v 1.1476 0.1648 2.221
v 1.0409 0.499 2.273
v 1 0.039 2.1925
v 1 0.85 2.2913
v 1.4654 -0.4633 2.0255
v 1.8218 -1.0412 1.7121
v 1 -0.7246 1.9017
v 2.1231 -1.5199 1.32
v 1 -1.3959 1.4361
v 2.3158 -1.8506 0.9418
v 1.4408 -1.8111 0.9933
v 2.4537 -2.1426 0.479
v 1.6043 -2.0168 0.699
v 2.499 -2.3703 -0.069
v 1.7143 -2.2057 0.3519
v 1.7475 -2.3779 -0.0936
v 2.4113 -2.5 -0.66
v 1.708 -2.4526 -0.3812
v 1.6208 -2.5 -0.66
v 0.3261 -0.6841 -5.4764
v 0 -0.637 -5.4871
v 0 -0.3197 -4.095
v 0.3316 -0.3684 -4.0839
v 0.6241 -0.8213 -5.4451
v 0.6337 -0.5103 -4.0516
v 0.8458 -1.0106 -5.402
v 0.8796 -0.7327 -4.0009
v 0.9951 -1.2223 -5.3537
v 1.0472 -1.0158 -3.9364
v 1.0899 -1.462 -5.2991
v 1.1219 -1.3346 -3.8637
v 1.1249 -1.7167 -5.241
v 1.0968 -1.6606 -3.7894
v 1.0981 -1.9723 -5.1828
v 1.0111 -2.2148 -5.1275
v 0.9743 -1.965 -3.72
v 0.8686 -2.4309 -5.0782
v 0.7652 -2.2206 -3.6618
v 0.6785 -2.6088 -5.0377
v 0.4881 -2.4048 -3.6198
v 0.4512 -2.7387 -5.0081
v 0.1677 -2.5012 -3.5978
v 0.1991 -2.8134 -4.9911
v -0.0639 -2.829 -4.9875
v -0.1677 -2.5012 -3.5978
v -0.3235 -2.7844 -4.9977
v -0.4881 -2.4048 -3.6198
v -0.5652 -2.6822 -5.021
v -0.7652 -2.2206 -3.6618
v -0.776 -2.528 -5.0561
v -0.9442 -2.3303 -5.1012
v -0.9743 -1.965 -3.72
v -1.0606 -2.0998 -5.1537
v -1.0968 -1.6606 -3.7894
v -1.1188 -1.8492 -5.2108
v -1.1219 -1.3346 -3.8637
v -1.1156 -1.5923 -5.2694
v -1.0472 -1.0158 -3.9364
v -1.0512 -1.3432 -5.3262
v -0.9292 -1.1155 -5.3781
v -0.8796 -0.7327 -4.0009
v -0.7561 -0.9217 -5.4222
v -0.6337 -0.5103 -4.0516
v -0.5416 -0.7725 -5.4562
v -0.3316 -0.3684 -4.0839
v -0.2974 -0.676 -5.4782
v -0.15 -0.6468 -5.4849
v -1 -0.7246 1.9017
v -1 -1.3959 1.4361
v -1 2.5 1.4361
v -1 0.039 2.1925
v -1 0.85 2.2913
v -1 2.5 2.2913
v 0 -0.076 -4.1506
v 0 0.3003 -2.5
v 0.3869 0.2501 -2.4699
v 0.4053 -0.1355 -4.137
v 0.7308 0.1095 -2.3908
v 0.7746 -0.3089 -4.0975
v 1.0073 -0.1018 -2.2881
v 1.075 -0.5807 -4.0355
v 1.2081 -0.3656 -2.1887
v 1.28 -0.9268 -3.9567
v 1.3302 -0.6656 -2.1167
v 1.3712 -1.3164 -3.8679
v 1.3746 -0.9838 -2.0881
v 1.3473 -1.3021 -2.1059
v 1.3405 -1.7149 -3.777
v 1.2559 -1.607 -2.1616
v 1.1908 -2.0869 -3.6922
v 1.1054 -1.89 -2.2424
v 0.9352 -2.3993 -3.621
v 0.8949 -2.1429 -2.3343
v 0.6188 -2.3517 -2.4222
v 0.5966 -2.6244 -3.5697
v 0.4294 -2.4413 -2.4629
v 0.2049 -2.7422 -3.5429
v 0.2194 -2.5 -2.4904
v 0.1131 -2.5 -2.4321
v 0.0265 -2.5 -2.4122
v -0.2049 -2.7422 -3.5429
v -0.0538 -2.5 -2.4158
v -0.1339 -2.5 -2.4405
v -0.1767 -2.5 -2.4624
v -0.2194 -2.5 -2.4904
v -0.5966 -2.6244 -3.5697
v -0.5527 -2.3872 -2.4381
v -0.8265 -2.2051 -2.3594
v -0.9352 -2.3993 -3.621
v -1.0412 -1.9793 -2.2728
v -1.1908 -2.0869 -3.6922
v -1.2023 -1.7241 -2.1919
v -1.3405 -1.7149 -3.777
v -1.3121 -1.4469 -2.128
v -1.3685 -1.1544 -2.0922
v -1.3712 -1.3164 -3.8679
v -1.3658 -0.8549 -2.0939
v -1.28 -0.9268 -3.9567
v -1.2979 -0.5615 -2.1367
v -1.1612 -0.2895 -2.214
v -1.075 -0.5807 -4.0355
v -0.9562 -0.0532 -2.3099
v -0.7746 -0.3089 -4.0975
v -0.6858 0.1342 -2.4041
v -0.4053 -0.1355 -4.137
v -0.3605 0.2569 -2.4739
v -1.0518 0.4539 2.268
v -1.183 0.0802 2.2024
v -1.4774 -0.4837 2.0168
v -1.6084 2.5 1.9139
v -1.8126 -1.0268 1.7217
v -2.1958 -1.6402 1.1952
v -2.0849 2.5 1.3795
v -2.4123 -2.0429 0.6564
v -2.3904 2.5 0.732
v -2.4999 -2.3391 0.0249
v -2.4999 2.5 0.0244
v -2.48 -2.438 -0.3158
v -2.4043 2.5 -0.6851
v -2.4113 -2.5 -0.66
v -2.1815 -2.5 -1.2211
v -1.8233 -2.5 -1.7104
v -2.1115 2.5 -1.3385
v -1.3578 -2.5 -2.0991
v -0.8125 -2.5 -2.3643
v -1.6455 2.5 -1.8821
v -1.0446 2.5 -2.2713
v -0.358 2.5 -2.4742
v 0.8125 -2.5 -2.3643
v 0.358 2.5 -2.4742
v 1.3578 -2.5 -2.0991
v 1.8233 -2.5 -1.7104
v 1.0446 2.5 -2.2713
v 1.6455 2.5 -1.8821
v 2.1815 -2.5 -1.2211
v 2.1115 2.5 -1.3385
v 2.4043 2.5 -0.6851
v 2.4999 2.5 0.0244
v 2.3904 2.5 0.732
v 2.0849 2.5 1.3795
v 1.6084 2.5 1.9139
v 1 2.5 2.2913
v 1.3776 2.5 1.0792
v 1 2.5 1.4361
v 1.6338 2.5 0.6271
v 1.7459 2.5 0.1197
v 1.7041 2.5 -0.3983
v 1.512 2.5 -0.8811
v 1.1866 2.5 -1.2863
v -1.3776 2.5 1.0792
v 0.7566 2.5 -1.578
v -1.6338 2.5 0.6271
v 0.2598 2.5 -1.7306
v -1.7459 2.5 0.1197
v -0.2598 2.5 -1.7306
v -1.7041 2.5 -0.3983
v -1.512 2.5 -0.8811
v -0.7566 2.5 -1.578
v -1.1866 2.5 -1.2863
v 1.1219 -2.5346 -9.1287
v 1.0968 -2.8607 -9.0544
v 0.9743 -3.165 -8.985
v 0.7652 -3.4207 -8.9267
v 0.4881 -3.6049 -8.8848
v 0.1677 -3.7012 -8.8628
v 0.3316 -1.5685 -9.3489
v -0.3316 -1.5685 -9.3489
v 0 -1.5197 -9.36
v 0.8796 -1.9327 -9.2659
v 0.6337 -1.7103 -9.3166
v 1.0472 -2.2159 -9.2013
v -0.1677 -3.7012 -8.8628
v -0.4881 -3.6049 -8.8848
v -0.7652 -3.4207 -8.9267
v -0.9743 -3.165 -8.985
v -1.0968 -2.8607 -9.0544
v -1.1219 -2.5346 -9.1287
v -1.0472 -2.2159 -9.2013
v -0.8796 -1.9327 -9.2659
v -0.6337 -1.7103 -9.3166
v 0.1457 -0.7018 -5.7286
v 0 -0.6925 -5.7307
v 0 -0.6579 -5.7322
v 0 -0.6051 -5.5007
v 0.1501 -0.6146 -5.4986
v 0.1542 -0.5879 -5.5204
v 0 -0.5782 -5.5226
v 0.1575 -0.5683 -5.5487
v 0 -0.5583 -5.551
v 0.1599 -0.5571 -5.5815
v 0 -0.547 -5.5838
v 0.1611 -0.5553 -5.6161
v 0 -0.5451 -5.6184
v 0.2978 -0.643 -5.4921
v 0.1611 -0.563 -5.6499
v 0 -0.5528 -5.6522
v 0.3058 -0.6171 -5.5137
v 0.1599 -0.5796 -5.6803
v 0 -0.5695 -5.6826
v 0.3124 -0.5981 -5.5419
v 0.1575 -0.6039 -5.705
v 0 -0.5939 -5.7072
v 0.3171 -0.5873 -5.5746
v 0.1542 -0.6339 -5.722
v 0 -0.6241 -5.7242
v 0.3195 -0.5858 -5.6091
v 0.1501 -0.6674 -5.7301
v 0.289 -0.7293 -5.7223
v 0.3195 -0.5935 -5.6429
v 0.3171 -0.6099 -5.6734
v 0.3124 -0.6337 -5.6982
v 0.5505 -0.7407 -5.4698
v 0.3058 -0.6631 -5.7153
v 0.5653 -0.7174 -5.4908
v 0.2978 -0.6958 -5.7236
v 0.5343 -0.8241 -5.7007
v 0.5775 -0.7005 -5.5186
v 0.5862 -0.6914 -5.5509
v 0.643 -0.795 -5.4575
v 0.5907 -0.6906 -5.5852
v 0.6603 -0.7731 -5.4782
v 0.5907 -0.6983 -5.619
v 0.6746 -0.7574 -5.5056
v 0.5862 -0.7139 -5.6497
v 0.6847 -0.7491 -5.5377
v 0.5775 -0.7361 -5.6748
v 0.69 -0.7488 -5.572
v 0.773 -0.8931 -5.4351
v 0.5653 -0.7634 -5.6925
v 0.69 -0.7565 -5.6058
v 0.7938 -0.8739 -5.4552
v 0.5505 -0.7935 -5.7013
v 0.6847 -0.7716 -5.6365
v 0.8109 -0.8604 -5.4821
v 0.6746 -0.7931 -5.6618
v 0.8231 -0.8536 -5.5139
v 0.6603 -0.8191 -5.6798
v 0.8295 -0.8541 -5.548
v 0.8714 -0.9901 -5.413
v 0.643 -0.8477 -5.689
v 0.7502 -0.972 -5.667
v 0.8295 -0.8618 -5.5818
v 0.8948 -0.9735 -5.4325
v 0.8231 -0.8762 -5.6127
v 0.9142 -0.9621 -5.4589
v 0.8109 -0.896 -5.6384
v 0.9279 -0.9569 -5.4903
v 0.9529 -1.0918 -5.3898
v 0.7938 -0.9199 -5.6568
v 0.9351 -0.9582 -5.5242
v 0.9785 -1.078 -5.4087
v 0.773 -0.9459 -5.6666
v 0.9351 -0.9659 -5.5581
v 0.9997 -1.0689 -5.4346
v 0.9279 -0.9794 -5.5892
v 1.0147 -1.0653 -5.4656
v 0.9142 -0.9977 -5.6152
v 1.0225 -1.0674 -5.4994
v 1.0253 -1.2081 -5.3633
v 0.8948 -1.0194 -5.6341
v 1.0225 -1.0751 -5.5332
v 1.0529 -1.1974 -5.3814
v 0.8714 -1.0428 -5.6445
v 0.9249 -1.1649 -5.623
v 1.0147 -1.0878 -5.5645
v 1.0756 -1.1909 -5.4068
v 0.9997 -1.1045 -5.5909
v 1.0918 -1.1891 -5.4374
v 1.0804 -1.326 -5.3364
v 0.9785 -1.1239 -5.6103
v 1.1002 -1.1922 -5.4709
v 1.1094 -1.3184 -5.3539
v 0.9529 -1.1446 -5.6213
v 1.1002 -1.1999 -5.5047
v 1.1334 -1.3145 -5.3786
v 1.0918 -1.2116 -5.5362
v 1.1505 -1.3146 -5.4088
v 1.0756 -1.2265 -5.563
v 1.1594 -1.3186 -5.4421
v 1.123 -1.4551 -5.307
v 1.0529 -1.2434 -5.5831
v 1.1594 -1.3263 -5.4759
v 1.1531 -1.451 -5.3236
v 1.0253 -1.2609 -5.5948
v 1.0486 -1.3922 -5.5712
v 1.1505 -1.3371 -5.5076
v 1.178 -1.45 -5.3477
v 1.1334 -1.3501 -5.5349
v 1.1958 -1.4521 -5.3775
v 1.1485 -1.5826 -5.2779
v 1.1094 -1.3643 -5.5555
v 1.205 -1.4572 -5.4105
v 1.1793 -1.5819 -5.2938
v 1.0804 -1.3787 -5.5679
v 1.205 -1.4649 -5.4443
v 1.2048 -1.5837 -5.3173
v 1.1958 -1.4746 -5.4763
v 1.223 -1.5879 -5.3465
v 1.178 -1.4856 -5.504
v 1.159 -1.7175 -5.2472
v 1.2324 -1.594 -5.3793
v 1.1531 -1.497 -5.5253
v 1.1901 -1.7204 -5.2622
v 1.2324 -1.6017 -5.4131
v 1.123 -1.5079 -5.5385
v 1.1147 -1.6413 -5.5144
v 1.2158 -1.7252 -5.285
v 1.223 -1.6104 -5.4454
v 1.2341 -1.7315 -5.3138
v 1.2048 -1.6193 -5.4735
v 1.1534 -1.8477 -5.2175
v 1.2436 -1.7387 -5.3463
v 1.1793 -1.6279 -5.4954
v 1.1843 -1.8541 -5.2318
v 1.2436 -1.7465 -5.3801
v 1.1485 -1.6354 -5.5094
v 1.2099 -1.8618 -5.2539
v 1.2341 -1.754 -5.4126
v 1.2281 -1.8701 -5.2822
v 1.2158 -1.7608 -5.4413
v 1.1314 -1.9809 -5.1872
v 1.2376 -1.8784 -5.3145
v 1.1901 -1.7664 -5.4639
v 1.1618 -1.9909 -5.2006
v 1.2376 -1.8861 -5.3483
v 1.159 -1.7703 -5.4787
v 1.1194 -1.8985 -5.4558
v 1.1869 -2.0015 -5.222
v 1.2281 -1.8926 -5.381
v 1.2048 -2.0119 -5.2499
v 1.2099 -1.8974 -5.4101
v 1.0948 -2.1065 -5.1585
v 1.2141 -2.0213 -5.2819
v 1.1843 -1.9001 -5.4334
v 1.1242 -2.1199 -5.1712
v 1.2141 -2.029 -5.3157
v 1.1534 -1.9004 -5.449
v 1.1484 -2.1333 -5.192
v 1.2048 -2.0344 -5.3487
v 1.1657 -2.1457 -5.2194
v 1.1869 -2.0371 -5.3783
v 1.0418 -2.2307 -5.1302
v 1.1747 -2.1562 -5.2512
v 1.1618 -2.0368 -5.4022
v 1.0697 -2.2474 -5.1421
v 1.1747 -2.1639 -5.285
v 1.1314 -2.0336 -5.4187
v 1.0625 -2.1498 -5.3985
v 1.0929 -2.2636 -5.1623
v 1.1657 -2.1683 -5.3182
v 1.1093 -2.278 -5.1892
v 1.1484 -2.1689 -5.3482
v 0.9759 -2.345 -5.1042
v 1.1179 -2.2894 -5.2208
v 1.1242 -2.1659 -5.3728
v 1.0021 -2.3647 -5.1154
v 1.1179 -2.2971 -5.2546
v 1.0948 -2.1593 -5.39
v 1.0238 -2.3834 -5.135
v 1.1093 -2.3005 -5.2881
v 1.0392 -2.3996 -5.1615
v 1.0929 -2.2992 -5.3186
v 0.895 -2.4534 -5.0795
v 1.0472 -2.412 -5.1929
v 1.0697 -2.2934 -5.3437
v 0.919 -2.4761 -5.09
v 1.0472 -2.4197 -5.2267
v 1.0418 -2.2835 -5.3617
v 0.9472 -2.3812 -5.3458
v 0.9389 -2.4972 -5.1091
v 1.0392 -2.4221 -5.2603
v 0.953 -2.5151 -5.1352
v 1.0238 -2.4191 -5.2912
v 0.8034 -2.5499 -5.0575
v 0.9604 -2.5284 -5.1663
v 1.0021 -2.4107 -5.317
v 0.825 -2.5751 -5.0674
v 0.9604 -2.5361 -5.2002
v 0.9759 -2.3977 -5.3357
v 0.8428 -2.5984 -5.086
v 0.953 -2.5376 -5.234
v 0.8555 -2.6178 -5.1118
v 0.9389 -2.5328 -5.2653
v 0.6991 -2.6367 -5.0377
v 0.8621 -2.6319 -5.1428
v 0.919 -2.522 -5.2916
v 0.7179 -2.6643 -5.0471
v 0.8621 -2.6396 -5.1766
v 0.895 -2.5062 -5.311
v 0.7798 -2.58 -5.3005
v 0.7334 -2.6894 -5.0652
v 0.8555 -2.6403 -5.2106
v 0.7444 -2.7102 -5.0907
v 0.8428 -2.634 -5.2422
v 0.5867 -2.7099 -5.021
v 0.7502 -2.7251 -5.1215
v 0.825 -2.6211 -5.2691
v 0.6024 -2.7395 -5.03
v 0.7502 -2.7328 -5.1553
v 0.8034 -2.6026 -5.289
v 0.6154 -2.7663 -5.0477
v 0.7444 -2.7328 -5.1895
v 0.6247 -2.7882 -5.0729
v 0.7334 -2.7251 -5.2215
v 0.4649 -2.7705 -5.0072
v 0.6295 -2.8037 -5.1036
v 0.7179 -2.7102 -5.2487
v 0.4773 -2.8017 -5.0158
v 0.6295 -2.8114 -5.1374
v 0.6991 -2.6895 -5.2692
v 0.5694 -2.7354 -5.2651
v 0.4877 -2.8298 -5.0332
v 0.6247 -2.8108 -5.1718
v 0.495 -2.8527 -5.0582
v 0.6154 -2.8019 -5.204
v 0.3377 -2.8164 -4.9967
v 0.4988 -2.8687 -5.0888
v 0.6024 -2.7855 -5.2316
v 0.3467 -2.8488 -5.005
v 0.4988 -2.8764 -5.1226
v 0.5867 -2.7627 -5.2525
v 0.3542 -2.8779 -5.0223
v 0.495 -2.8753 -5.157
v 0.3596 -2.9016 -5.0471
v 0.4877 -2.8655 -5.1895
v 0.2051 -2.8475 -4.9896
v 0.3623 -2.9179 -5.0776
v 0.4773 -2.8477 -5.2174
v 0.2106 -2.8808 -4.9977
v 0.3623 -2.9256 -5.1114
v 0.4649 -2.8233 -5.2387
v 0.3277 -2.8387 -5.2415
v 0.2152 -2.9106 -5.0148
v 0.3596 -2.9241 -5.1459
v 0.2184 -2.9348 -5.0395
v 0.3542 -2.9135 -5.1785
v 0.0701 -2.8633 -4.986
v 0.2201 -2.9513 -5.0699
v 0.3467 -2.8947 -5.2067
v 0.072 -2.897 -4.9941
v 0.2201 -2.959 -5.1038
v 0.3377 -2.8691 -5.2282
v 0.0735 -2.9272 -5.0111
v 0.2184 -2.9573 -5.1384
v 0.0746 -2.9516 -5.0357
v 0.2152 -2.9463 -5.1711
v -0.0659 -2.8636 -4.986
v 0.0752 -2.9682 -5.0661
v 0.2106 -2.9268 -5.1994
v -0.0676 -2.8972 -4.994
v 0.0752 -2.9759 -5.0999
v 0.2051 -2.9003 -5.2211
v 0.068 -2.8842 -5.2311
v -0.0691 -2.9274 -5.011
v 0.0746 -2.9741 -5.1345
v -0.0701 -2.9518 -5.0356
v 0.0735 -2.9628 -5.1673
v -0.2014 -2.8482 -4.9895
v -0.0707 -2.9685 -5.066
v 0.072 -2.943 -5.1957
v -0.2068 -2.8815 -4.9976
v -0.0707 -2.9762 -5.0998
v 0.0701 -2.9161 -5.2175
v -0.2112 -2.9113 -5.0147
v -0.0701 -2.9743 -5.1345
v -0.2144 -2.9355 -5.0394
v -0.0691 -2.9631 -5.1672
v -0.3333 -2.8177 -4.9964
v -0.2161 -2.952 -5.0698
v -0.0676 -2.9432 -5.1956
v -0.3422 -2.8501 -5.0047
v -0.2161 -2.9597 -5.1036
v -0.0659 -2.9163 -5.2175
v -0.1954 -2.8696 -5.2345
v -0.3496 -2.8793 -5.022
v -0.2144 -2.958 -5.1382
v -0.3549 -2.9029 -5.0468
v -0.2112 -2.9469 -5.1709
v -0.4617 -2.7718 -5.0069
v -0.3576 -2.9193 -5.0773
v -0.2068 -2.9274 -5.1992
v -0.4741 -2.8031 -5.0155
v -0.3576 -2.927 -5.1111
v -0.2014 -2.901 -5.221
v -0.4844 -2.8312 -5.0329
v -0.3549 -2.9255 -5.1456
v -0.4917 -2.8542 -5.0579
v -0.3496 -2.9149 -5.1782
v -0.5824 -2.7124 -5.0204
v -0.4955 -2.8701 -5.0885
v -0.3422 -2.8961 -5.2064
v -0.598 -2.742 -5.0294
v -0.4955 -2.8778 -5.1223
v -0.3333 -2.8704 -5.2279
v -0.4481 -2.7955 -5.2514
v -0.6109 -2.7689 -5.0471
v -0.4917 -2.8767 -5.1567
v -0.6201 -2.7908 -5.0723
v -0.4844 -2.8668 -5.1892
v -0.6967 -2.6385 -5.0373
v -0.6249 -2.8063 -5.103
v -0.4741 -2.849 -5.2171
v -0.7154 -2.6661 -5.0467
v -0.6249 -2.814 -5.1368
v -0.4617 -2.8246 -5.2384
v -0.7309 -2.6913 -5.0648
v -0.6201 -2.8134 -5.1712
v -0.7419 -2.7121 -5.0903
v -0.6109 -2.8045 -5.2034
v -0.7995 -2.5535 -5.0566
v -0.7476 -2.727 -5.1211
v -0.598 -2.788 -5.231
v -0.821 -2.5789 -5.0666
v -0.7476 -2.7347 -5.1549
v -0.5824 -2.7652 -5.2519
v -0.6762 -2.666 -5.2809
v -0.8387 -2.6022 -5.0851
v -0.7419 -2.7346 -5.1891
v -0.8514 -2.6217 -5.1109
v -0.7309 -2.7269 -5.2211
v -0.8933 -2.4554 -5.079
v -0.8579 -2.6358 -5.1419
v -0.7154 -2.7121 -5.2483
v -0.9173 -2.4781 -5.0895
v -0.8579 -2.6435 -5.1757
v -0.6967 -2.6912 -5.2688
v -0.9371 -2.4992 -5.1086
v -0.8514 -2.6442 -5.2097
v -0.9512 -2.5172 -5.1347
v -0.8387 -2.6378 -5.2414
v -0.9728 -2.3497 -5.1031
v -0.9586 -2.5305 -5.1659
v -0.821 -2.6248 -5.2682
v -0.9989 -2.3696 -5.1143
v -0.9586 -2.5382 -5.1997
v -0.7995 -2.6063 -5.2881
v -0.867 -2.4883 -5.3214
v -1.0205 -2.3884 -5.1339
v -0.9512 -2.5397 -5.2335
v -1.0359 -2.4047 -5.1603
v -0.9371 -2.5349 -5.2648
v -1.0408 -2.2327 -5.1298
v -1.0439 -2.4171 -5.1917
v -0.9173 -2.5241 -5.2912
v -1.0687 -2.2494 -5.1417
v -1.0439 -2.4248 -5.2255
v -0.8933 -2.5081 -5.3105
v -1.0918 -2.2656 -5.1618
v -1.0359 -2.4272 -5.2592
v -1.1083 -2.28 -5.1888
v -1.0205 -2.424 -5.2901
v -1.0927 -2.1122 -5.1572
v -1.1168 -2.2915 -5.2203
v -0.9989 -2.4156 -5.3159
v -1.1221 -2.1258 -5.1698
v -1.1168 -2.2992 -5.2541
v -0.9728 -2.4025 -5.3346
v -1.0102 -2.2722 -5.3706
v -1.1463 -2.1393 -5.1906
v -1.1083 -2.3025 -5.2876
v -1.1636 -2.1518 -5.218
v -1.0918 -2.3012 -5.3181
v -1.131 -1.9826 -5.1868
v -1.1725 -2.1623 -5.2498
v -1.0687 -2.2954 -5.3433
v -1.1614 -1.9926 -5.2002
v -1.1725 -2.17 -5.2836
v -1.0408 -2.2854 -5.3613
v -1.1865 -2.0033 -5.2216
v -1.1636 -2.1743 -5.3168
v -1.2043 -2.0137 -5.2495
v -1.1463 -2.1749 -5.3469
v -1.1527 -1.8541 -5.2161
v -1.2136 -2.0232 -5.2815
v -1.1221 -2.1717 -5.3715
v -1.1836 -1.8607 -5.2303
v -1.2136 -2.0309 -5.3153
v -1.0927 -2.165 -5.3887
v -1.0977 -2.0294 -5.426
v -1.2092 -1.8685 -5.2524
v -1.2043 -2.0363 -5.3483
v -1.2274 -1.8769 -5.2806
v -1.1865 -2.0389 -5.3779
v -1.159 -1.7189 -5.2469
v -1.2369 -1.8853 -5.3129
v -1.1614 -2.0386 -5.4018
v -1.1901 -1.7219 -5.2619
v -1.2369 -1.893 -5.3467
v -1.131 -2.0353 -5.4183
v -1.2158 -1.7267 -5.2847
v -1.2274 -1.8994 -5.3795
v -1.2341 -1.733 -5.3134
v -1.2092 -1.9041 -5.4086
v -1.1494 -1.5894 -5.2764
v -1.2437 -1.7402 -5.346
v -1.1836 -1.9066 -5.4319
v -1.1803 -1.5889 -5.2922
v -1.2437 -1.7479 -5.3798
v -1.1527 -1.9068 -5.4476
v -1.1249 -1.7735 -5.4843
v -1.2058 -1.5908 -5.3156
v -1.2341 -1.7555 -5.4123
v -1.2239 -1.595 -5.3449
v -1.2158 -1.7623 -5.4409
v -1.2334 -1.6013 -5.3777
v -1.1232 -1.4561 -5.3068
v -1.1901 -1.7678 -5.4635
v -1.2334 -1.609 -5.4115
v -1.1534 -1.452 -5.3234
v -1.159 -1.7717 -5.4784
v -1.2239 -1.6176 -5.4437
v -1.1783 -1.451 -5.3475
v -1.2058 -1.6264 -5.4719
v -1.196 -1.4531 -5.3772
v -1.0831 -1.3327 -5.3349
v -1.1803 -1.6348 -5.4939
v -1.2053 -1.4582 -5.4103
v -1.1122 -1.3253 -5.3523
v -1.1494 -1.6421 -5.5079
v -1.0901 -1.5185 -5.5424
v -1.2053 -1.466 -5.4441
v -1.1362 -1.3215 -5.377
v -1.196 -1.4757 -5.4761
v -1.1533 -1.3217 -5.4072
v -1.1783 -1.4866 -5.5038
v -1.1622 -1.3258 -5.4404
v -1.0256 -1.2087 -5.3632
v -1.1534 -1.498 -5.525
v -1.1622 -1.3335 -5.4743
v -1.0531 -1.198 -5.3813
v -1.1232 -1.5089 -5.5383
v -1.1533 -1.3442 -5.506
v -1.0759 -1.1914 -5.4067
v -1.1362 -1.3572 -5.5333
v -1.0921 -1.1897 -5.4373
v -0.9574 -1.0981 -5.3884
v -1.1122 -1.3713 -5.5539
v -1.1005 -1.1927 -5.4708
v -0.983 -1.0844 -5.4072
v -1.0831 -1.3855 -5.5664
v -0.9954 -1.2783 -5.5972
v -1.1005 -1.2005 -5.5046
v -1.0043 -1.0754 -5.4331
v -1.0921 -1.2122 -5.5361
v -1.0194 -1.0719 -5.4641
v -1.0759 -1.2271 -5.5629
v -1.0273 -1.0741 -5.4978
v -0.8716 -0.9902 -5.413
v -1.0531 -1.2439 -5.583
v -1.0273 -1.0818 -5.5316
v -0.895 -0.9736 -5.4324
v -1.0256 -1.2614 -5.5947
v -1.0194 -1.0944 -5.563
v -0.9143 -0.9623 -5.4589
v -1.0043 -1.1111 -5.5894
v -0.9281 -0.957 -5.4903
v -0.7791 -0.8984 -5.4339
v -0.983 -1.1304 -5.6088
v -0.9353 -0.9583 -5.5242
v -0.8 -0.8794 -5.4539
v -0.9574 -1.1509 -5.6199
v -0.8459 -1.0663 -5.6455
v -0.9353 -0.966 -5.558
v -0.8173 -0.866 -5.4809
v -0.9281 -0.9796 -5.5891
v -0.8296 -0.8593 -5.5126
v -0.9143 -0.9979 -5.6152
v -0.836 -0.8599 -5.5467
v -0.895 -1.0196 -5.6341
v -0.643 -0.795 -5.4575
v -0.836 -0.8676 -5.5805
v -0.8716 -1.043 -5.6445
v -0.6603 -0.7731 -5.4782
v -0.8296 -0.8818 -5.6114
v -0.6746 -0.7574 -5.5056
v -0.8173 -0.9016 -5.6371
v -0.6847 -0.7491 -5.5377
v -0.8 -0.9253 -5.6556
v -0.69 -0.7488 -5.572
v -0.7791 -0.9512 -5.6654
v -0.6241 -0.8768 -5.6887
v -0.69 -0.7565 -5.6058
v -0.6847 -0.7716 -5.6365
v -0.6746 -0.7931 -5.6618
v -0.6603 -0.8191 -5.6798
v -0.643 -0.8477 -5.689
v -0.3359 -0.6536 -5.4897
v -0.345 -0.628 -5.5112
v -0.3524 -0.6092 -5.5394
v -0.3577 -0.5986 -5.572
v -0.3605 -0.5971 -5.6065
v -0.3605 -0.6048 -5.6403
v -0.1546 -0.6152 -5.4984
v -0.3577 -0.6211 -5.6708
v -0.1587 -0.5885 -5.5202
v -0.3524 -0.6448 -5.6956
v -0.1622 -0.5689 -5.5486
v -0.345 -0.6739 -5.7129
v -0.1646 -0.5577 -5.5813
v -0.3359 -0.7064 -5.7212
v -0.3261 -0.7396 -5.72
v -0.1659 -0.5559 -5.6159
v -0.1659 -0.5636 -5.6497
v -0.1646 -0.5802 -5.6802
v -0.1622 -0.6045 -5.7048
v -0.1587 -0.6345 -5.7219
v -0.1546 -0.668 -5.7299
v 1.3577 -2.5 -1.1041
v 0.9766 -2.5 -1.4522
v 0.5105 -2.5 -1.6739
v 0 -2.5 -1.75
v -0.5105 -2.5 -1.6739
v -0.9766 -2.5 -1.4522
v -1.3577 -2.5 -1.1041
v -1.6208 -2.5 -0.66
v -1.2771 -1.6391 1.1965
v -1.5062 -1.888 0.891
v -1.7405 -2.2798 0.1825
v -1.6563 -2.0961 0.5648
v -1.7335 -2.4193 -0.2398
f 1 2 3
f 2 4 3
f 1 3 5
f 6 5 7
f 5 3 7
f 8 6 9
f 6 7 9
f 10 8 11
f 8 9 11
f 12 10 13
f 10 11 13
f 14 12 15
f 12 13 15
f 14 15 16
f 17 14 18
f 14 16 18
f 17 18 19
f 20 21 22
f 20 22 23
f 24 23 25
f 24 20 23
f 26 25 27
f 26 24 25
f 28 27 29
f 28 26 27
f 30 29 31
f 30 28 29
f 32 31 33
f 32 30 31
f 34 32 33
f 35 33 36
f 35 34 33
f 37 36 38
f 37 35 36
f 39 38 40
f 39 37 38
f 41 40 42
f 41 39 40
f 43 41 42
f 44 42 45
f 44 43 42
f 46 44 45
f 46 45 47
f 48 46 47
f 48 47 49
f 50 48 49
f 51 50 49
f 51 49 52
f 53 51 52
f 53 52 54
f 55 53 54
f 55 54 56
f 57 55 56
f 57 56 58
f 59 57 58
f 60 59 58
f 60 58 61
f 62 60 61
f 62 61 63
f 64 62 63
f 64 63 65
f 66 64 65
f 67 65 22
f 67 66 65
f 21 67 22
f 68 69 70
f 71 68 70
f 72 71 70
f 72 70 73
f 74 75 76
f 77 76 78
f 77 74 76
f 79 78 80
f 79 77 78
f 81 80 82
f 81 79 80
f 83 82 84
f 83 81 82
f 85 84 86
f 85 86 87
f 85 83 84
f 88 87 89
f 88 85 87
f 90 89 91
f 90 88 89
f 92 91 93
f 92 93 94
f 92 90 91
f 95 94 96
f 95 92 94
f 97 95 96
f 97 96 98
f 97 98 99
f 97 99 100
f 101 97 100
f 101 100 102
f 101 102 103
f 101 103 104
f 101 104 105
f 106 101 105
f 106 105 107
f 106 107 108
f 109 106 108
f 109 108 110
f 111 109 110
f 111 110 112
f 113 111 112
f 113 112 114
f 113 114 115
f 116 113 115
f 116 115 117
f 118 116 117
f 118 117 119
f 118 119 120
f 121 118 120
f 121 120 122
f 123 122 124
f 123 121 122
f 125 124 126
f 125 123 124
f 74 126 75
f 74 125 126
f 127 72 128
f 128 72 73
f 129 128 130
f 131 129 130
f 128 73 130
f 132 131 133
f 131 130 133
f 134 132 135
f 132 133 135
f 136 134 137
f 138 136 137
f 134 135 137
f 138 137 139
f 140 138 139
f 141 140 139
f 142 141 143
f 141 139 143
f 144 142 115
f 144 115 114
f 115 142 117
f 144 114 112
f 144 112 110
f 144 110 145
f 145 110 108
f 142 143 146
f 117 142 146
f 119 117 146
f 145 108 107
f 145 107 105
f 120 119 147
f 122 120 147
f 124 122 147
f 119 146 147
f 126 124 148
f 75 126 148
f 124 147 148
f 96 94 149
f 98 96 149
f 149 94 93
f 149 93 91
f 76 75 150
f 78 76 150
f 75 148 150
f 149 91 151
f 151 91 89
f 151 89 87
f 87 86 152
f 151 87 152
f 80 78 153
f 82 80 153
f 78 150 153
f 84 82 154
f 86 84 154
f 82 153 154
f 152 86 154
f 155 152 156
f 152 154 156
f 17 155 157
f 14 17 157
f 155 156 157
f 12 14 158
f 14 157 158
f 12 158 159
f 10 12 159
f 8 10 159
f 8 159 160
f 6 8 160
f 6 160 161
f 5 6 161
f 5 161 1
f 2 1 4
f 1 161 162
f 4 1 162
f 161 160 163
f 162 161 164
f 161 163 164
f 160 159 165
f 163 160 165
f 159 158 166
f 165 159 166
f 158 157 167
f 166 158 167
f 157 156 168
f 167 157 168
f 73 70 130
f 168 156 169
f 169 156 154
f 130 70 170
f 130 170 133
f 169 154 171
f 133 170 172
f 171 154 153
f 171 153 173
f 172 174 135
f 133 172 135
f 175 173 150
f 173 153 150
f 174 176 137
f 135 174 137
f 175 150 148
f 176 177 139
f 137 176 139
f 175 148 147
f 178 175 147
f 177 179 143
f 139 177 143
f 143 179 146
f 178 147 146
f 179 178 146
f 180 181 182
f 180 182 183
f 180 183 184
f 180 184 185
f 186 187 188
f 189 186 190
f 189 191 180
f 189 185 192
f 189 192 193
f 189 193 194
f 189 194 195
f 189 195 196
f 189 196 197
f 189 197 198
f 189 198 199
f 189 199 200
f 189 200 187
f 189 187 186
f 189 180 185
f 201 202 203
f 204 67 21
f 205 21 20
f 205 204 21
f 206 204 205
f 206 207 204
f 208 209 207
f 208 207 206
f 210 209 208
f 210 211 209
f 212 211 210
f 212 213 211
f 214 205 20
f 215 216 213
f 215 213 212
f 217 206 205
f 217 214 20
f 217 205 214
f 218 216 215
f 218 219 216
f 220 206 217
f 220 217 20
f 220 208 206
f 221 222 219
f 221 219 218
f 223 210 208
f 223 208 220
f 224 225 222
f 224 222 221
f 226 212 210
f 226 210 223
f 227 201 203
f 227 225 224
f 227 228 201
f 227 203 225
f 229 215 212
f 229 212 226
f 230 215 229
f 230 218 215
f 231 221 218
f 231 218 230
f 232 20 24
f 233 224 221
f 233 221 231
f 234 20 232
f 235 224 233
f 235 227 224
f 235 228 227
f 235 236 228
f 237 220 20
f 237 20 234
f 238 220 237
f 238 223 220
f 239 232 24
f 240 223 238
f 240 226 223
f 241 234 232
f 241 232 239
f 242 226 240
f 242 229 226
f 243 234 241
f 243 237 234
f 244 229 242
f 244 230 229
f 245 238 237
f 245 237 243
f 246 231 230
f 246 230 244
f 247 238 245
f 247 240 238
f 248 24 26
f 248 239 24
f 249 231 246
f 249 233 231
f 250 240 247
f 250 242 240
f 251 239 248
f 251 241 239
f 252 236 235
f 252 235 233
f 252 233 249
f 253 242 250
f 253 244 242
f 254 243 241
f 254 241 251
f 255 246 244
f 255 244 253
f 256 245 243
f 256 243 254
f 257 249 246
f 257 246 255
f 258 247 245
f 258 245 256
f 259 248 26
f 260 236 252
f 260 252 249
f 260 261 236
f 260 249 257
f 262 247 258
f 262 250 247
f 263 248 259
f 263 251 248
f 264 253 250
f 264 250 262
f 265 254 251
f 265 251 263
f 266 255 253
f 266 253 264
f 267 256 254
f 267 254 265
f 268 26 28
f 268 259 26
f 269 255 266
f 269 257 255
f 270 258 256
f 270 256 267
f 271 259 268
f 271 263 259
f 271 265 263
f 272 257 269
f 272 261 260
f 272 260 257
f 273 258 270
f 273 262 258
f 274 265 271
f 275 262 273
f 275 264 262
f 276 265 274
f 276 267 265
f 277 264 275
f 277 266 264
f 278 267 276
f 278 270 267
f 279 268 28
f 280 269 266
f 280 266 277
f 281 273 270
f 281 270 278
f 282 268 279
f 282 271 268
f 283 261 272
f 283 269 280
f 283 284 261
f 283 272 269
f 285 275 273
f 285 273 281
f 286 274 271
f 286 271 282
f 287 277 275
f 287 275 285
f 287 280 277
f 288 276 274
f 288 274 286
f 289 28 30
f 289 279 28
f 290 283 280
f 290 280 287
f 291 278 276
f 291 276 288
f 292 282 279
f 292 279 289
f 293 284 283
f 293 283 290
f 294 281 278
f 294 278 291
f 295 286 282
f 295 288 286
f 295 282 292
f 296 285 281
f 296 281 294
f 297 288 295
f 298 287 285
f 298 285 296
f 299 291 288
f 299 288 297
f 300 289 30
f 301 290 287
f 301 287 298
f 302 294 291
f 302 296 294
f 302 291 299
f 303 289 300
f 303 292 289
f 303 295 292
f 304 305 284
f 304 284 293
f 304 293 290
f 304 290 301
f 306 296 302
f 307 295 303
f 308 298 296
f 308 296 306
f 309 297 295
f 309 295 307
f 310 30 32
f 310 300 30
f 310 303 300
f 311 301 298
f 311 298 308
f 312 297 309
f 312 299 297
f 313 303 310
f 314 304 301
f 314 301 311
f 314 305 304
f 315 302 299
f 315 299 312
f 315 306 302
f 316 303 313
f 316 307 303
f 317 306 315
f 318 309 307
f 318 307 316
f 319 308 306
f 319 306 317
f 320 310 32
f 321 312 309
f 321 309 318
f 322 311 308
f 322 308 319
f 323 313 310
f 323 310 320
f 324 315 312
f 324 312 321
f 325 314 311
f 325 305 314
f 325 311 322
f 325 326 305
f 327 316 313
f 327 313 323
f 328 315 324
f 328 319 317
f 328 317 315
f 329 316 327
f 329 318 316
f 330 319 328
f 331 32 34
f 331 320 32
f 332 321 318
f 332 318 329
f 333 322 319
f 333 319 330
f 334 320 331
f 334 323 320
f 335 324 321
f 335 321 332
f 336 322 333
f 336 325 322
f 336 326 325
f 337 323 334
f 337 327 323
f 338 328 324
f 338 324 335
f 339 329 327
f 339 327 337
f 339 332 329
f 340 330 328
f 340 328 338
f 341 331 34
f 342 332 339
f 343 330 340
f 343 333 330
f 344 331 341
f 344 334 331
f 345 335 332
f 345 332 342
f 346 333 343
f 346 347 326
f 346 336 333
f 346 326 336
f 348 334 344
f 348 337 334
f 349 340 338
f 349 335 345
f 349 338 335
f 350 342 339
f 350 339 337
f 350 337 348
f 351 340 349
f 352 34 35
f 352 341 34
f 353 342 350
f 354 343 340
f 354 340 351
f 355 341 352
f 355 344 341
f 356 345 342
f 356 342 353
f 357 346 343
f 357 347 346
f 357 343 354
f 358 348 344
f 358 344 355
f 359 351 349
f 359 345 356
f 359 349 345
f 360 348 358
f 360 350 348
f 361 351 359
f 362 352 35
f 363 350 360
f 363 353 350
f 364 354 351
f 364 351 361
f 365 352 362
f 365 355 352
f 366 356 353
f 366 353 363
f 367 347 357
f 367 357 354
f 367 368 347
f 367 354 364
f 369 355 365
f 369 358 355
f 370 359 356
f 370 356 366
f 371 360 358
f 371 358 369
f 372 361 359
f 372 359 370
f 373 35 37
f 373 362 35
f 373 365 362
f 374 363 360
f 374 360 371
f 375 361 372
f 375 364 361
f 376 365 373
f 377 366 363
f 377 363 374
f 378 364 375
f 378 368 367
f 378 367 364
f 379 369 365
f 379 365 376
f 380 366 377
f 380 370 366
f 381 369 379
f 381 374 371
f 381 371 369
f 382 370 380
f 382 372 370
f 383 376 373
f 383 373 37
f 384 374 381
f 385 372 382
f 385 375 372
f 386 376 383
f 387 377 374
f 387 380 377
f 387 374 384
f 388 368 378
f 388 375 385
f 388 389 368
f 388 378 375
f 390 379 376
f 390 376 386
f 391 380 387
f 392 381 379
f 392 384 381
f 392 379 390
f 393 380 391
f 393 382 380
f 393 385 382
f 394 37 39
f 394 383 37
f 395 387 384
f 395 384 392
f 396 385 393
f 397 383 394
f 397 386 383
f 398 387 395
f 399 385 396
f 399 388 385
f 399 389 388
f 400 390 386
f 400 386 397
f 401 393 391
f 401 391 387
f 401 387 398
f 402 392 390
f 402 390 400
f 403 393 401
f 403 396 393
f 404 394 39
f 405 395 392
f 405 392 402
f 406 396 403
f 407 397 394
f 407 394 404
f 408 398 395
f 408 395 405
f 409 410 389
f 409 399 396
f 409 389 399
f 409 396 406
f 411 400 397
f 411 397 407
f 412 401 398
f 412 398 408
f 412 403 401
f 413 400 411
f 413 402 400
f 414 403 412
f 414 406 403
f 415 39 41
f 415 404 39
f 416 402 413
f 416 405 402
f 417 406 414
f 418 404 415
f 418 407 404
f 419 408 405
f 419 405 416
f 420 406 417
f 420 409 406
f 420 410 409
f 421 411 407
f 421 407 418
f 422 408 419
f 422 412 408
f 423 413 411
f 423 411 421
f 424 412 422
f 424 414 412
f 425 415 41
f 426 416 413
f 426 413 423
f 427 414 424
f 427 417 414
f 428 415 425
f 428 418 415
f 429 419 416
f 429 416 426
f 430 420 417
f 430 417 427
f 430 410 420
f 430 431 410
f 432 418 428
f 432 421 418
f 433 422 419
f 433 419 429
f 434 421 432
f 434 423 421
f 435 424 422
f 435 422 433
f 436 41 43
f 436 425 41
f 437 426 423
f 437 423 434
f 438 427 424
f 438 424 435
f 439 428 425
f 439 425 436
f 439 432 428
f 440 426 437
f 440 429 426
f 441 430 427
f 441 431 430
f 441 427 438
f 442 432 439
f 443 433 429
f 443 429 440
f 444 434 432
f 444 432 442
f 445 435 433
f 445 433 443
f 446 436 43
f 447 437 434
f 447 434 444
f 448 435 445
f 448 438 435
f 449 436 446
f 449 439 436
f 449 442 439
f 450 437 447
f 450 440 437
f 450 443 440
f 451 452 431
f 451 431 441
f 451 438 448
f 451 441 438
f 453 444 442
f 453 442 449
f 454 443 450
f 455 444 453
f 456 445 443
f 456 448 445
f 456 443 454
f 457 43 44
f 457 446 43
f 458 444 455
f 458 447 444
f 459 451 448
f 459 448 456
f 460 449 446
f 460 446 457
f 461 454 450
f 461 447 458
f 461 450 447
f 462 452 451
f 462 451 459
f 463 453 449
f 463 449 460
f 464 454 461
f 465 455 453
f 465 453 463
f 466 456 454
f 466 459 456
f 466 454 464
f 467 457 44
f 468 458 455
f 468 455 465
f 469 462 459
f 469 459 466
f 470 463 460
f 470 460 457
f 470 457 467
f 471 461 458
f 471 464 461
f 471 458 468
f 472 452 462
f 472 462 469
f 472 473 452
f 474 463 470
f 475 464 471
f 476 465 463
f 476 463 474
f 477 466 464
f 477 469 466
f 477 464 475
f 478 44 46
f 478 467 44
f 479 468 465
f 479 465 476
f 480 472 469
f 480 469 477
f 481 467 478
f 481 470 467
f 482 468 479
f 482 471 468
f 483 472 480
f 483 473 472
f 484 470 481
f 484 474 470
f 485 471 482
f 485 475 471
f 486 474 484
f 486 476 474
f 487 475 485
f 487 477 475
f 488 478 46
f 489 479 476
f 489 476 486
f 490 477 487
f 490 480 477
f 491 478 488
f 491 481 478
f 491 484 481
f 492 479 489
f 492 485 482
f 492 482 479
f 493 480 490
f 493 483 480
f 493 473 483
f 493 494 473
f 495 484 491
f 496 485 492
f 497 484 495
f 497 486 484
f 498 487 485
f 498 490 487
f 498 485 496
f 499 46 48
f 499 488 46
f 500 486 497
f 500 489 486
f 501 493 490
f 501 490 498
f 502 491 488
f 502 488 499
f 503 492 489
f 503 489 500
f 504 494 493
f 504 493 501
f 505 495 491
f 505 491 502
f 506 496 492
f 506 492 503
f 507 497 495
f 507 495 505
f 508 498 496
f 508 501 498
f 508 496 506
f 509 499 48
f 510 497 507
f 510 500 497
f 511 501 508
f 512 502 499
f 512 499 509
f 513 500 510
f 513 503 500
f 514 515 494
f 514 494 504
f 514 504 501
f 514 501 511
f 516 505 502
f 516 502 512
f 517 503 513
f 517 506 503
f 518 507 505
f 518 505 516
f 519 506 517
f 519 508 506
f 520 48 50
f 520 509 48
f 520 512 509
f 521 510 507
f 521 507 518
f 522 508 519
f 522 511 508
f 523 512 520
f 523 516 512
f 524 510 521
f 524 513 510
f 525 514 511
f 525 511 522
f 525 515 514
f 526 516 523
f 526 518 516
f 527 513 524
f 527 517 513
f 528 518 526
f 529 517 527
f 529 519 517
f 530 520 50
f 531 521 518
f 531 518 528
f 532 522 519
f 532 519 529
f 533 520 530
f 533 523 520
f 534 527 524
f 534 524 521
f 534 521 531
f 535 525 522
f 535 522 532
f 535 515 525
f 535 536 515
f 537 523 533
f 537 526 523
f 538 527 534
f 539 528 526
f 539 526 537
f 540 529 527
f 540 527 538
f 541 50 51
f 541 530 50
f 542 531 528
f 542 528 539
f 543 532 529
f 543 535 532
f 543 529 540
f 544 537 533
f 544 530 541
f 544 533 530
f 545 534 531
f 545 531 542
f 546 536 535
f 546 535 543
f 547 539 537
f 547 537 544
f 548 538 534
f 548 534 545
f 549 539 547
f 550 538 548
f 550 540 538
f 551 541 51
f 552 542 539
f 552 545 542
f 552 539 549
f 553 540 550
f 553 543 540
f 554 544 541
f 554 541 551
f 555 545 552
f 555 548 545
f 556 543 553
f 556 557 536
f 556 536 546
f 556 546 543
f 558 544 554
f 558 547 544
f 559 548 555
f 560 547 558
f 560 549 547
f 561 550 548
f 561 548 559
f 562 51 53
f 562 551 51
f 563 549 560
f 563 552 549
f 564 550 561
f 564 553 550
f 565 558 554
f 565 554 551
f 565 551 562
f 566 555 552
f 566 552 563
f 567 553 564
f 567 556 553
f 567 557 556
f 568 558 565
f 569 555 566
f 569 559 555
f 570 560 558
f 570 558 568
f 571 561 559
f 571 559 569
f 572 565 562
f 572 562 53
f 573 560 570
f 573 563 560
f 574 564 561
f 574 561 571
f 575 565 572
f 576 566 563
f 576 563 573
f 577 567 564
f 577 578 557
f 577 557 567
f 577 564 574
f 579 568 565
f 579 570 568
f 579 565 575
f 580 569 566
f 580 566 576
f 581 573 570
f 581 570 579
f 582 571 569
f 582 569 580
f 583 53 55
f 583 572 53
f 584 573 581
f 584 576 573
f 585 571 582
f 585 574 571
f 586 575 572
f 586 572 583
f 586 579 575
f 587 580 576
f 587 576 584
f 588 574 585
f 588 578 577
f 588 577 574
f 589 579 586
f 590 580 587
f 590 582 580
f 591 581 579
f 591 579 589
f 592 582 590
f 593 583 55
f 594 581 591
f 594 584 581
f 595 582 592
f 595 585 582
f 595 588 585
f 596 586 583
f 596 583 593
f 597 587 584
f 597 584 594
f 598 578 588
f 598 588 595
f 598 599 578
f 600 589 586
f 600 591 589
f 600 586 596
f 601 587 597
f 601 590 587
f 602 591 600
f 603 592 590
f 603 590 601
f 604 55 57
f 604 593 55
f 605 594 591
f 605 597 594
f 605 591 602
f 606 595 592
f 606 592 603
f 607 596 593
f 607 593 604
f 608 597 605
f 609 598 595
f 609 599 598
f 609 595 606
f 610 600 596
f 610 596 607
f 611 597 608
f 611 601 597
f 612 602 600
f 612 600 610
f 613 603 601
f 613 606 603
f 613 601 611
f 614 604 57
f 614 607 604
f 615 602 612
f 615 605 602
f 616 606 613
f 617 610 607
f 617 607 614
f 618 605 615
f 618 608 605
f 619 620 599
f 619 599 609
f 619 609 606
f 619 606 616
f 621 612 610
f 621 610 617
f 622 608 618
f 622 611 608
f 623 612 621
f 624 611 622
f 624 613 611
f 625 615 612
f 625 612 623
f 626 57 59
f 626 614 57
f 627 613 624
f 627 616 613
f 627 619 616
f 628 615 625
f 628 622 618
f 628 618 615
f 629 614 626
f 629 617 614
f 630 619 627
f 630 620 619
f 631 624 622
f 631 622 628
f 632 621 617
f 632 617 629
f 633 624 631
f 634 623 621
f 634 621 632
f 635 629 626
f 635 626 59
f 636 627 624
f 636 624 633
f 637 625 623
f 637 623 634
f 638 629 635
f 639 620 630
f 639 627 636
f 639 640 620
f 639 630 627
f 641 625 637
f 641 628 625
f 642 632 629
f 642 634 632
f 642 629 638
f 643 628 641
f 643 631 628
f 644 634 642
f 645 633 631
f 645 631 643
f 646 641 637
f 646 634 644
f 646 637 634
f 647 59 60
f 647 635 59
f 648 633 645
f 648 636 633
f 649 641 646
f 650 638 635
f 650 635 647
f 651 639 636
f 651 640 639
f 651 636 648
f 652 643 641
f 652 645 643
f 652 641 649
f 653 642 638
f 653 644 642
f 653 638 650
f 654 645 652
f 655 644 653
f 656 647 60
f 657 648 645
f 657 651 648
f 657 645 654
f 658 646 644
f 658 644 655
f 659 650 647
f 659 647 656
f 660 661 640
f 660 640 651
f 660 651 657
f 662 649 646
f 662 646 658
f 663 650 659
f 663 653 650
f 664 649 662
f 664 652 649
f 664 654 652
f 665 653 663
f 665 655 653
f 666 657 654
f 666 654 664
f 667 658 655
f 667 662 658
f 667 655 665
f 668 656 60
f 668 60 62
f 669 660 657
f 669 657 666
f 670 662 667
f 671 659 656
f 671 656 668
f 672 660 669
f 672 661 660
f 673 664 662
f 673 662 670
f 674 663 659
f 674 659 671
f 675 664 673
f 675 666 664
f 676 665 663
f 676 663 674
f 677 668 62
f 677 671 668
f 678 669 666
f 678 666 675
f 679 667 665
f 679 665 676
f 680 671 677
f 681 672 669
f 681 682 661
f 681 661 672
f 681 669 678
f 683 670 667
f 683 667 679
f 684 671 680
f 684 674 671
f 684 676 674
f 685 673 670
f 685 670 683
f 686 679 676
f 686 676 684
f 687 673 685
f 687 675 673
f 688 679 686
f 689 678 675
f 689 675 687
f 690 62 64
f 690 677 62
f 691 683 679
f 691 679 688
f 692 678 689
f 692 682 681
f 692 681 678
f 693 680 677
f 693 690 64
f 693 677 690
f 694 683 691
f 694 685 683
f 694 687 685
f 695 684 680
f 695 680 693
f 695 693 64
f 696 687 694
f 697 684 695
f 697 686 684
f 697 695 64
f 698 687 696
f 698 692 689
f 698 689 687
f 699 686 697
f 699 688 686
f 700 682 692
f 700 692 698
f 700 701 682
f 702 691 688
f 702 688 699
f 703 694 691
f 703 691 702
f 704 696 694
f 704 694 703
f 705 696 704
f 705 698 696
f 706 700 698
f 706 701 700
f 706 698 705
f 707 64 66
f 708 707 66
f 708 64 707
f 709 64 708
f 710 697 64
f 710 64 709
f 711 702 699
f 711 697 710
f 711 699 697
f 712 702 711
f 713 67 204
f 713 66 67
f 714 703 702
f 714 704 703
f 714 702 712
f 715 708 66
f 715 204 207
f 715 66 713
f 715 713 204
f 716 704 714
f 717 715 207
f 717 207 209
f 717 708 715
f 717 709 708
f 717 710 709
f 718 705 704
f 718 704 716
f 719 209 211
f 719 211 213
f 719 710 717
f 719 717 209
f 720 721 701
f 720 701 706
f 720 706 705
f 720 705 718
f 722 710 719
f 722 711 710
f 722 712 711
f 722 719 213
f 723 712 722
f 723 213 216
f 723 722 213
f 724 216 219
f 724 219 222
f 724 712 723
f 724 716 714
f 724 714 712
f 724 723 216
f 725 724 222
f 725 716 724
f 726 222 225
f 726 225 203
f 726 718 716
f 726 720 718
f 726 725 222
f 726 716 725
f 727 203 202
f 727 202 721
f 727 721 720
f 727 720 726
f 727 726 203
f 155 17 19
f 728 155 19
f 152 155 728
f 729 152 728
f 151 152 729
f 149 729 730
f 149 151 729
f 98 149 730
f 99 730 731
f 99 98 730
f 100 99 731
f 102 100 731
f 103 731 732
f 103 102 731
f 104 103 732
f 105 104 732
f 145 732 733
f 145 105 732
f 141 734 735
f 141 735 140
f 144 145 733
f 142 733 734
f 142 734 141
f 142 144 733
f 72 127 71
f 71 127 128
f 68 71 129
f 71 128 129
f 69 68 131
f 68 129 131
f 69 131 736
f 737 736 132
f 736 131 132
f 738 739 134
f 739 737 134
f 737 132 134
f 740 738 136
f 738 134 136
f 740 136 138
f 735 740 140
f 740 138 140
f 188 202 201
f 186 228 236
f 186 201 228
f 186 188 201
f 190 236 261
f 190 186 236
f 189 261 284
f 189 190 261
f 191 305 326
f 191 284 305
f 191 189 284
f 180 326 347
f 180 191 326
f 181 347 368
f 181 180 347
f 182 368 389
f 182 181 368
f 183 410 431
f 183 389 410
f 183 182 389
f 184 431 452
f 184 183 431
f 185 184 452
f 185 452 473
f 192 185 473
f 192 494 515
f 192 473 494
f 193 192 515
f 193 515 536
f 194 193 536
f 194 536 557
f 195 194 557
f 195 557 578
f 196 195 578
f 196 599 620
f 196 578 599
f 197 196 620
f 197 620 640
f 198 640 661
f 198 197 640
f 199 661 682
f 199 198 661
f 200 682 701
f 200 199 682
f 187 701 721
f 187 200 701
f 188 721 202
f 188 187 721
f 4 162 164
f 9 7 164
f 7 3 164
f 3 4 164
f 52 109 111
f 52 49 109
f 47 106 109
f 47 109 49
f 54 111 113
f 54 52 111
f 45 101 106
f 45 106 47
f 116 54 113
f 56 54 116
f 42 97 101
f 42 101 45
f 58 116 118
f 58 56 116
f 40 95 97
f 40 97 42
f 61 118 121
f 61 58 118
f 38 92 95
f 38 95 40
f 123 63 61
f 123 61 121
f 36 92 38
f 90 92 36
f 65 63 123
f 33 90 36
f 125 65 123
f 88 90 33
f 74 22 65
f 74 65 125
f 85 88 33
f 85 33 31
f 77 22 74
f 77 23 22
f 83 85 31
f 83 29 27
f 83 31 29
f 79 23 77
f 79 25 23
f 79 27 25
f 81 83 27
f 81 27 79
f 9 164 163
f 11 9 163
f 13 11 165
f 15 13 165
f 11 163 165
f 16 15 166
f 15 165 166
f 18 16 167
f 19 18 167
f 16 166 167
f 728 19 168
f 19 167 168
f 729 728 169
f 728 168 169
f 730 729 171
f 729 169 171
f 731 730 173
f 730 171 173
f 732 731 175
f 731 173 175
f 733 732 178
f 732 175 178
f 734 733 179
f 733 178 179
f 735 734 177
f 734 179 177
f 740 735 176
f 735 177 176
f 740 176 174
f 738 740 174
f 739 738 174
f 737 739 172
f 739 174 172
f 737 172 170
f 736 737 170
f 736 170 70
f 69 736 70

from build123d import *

# Parameters (mm, degrees)
BOSS_EXTRUDE1_DEPTH      = 2.5
CUT_EXTRUDE8_DEPTH       = 5.330127019
CUT_EXTRUDE8_DEPTH_BACK  = 5.330127019
BOSS_EXTRUDE2_REACH      = 14.744
BOSS_EXTRUDE2_END_RADIUS = 2.5
SKETCH6_R                = 1.125
BOSS_EXTRUDE4_REACH      = 20.144
BOSS_EXTRUDE4_START      = -5.4
SKETCH7_R                = 1.375
SKETCH5_R                = 0.125


with BuildPart() as part:
    # Sketch3 → Boss-Extrude1 (new, symmetric)
    with BuildSketch(Plane(origin=(0, 0, 0), x_dir=(1, 0, 0), z_dir=(0, 1, 0))):
        with BuildLine():
            Line((-1, -1.436140662), (-1, -2.291287847))
            ThreePointArc((-1, -2.291287847), (0, 2.5), (1, -2.291287847))
            Line((1, -2.291287847), (1, -1.436140662))
            ThreePointArc((1, -1.436140662), (0, 1.75), (-1, -1.436140662))
        make_face()
    extrude(amount=BOSS_EXTRUDE1_DEPTH, both=True)

    # Sketch4 → Cut-Extrude8 (cut, two sides: drawn at the far end of the back side and taken through both)
    with BuildSketch(Plane(origin=(0, 0, 0), x_dir=(0, 0, -1), z_dir=(1, 0, 0)).offset(-CUT_EXTRUDE8_DEPTH_BACK)):
        with BuildLine():
            ThreePointArc((-2.291287847, 0.85), (-1.448230481, -1.382297021), (0.66, -2.5))
            Line((0.66, -2.5), (-2.291287847, -2.5))
            Line((-2.291287847, -2.5), (-2.291287847, 0.85))
        make_face()
    extrude(amount=CUT_EXTRUDE8_DEPTH + CUT_EXTRUDE8_DEPTH_BACK, mode=Mode.SUBTRACT)

    # Boss-Extrude2: up to this cylinder (the profile starts outside it)
    boss_extrude2_end = Plane(origin=(0, -2.616609, 0), z_dir=(0, -1, 0)) * Cylinder(BOSS_EXTRUDE2_END_RADIUS, 35.488, mode=Mode.PRIVATE)
    # Sketch6 → Boss-Extrude2 (add, up to the surface)
    with BuildSketch(Plane(origin=(0, -2.616608772, -9.11), x_dir=(-1, 0, 0), z_dir=(0, -0.22222922625140035, -0.9749944466506996)), mode=Mode.PRIVATE) as boss_extrude2_sk1:
        with Locations(Location((0, 0, 0), (0, 0, 90))):
            Circle(SKETCH6_R)
    boss_extrude2_tool1 = extrude(boss_extrude2_sk1.sketch, amount=-BOSS_EXTRUDE2_REACH, mode=Mode.PRIVATE) - boss_extrude2_end
    add(boss_extrude2_tool1.solids().sort_by_distance((0, -2.616609, -9.11))[0])

    # Sketch7 → Boss-Extrude4 (add, up to next)
    with BuildSketch(Plane(origin=(0, -2.616608772, -9.11), x_dir=(-1, 0, 0), z_dir=(0, -0.22222922625140035, -0.9749944466506996)).offset(BOSS_EXTRUDE4_START), mode=Mode.PRIVATE) as boss_extrude4_sk1:
        with Locations(Location((0, 0, 0), (0, 0, 90))):
            Circle(SKETCH7_R)
    boss_extrude4_tool1 = extrude(boss_extrude4_sk1.sketch, amount=-BOSS_EXTRUDE4_REACH, mode=Mode.PRIVATE) - part.part
    add(boss_extrude4_tool1.solids().sort_by_distance((0, -1.416571, -3.84503))[0])

    # Sketch5 → Revolve1 (revolve)
    with BuildSketch(Plane(origin=(0, 0, 0), x_dir=(0, 0, -1), z_dir=(1, 0, 0)), mode=Mode.PRIVATE) as revolve1_sk:
        with Locations((5.11, -2.853618424)):
            Circle(SKETCH5_R)
    revolve(revolve1_sk.sketch.rotate(Axis((0, -1.11, -2.5), (0, -0.22222922625140032, -0.9749944466506997)), 180), axis=Axis((0, -1.11, -2.5), (0, -0.22222922625140032, -0.9749944466506997)))


solid = part.part
